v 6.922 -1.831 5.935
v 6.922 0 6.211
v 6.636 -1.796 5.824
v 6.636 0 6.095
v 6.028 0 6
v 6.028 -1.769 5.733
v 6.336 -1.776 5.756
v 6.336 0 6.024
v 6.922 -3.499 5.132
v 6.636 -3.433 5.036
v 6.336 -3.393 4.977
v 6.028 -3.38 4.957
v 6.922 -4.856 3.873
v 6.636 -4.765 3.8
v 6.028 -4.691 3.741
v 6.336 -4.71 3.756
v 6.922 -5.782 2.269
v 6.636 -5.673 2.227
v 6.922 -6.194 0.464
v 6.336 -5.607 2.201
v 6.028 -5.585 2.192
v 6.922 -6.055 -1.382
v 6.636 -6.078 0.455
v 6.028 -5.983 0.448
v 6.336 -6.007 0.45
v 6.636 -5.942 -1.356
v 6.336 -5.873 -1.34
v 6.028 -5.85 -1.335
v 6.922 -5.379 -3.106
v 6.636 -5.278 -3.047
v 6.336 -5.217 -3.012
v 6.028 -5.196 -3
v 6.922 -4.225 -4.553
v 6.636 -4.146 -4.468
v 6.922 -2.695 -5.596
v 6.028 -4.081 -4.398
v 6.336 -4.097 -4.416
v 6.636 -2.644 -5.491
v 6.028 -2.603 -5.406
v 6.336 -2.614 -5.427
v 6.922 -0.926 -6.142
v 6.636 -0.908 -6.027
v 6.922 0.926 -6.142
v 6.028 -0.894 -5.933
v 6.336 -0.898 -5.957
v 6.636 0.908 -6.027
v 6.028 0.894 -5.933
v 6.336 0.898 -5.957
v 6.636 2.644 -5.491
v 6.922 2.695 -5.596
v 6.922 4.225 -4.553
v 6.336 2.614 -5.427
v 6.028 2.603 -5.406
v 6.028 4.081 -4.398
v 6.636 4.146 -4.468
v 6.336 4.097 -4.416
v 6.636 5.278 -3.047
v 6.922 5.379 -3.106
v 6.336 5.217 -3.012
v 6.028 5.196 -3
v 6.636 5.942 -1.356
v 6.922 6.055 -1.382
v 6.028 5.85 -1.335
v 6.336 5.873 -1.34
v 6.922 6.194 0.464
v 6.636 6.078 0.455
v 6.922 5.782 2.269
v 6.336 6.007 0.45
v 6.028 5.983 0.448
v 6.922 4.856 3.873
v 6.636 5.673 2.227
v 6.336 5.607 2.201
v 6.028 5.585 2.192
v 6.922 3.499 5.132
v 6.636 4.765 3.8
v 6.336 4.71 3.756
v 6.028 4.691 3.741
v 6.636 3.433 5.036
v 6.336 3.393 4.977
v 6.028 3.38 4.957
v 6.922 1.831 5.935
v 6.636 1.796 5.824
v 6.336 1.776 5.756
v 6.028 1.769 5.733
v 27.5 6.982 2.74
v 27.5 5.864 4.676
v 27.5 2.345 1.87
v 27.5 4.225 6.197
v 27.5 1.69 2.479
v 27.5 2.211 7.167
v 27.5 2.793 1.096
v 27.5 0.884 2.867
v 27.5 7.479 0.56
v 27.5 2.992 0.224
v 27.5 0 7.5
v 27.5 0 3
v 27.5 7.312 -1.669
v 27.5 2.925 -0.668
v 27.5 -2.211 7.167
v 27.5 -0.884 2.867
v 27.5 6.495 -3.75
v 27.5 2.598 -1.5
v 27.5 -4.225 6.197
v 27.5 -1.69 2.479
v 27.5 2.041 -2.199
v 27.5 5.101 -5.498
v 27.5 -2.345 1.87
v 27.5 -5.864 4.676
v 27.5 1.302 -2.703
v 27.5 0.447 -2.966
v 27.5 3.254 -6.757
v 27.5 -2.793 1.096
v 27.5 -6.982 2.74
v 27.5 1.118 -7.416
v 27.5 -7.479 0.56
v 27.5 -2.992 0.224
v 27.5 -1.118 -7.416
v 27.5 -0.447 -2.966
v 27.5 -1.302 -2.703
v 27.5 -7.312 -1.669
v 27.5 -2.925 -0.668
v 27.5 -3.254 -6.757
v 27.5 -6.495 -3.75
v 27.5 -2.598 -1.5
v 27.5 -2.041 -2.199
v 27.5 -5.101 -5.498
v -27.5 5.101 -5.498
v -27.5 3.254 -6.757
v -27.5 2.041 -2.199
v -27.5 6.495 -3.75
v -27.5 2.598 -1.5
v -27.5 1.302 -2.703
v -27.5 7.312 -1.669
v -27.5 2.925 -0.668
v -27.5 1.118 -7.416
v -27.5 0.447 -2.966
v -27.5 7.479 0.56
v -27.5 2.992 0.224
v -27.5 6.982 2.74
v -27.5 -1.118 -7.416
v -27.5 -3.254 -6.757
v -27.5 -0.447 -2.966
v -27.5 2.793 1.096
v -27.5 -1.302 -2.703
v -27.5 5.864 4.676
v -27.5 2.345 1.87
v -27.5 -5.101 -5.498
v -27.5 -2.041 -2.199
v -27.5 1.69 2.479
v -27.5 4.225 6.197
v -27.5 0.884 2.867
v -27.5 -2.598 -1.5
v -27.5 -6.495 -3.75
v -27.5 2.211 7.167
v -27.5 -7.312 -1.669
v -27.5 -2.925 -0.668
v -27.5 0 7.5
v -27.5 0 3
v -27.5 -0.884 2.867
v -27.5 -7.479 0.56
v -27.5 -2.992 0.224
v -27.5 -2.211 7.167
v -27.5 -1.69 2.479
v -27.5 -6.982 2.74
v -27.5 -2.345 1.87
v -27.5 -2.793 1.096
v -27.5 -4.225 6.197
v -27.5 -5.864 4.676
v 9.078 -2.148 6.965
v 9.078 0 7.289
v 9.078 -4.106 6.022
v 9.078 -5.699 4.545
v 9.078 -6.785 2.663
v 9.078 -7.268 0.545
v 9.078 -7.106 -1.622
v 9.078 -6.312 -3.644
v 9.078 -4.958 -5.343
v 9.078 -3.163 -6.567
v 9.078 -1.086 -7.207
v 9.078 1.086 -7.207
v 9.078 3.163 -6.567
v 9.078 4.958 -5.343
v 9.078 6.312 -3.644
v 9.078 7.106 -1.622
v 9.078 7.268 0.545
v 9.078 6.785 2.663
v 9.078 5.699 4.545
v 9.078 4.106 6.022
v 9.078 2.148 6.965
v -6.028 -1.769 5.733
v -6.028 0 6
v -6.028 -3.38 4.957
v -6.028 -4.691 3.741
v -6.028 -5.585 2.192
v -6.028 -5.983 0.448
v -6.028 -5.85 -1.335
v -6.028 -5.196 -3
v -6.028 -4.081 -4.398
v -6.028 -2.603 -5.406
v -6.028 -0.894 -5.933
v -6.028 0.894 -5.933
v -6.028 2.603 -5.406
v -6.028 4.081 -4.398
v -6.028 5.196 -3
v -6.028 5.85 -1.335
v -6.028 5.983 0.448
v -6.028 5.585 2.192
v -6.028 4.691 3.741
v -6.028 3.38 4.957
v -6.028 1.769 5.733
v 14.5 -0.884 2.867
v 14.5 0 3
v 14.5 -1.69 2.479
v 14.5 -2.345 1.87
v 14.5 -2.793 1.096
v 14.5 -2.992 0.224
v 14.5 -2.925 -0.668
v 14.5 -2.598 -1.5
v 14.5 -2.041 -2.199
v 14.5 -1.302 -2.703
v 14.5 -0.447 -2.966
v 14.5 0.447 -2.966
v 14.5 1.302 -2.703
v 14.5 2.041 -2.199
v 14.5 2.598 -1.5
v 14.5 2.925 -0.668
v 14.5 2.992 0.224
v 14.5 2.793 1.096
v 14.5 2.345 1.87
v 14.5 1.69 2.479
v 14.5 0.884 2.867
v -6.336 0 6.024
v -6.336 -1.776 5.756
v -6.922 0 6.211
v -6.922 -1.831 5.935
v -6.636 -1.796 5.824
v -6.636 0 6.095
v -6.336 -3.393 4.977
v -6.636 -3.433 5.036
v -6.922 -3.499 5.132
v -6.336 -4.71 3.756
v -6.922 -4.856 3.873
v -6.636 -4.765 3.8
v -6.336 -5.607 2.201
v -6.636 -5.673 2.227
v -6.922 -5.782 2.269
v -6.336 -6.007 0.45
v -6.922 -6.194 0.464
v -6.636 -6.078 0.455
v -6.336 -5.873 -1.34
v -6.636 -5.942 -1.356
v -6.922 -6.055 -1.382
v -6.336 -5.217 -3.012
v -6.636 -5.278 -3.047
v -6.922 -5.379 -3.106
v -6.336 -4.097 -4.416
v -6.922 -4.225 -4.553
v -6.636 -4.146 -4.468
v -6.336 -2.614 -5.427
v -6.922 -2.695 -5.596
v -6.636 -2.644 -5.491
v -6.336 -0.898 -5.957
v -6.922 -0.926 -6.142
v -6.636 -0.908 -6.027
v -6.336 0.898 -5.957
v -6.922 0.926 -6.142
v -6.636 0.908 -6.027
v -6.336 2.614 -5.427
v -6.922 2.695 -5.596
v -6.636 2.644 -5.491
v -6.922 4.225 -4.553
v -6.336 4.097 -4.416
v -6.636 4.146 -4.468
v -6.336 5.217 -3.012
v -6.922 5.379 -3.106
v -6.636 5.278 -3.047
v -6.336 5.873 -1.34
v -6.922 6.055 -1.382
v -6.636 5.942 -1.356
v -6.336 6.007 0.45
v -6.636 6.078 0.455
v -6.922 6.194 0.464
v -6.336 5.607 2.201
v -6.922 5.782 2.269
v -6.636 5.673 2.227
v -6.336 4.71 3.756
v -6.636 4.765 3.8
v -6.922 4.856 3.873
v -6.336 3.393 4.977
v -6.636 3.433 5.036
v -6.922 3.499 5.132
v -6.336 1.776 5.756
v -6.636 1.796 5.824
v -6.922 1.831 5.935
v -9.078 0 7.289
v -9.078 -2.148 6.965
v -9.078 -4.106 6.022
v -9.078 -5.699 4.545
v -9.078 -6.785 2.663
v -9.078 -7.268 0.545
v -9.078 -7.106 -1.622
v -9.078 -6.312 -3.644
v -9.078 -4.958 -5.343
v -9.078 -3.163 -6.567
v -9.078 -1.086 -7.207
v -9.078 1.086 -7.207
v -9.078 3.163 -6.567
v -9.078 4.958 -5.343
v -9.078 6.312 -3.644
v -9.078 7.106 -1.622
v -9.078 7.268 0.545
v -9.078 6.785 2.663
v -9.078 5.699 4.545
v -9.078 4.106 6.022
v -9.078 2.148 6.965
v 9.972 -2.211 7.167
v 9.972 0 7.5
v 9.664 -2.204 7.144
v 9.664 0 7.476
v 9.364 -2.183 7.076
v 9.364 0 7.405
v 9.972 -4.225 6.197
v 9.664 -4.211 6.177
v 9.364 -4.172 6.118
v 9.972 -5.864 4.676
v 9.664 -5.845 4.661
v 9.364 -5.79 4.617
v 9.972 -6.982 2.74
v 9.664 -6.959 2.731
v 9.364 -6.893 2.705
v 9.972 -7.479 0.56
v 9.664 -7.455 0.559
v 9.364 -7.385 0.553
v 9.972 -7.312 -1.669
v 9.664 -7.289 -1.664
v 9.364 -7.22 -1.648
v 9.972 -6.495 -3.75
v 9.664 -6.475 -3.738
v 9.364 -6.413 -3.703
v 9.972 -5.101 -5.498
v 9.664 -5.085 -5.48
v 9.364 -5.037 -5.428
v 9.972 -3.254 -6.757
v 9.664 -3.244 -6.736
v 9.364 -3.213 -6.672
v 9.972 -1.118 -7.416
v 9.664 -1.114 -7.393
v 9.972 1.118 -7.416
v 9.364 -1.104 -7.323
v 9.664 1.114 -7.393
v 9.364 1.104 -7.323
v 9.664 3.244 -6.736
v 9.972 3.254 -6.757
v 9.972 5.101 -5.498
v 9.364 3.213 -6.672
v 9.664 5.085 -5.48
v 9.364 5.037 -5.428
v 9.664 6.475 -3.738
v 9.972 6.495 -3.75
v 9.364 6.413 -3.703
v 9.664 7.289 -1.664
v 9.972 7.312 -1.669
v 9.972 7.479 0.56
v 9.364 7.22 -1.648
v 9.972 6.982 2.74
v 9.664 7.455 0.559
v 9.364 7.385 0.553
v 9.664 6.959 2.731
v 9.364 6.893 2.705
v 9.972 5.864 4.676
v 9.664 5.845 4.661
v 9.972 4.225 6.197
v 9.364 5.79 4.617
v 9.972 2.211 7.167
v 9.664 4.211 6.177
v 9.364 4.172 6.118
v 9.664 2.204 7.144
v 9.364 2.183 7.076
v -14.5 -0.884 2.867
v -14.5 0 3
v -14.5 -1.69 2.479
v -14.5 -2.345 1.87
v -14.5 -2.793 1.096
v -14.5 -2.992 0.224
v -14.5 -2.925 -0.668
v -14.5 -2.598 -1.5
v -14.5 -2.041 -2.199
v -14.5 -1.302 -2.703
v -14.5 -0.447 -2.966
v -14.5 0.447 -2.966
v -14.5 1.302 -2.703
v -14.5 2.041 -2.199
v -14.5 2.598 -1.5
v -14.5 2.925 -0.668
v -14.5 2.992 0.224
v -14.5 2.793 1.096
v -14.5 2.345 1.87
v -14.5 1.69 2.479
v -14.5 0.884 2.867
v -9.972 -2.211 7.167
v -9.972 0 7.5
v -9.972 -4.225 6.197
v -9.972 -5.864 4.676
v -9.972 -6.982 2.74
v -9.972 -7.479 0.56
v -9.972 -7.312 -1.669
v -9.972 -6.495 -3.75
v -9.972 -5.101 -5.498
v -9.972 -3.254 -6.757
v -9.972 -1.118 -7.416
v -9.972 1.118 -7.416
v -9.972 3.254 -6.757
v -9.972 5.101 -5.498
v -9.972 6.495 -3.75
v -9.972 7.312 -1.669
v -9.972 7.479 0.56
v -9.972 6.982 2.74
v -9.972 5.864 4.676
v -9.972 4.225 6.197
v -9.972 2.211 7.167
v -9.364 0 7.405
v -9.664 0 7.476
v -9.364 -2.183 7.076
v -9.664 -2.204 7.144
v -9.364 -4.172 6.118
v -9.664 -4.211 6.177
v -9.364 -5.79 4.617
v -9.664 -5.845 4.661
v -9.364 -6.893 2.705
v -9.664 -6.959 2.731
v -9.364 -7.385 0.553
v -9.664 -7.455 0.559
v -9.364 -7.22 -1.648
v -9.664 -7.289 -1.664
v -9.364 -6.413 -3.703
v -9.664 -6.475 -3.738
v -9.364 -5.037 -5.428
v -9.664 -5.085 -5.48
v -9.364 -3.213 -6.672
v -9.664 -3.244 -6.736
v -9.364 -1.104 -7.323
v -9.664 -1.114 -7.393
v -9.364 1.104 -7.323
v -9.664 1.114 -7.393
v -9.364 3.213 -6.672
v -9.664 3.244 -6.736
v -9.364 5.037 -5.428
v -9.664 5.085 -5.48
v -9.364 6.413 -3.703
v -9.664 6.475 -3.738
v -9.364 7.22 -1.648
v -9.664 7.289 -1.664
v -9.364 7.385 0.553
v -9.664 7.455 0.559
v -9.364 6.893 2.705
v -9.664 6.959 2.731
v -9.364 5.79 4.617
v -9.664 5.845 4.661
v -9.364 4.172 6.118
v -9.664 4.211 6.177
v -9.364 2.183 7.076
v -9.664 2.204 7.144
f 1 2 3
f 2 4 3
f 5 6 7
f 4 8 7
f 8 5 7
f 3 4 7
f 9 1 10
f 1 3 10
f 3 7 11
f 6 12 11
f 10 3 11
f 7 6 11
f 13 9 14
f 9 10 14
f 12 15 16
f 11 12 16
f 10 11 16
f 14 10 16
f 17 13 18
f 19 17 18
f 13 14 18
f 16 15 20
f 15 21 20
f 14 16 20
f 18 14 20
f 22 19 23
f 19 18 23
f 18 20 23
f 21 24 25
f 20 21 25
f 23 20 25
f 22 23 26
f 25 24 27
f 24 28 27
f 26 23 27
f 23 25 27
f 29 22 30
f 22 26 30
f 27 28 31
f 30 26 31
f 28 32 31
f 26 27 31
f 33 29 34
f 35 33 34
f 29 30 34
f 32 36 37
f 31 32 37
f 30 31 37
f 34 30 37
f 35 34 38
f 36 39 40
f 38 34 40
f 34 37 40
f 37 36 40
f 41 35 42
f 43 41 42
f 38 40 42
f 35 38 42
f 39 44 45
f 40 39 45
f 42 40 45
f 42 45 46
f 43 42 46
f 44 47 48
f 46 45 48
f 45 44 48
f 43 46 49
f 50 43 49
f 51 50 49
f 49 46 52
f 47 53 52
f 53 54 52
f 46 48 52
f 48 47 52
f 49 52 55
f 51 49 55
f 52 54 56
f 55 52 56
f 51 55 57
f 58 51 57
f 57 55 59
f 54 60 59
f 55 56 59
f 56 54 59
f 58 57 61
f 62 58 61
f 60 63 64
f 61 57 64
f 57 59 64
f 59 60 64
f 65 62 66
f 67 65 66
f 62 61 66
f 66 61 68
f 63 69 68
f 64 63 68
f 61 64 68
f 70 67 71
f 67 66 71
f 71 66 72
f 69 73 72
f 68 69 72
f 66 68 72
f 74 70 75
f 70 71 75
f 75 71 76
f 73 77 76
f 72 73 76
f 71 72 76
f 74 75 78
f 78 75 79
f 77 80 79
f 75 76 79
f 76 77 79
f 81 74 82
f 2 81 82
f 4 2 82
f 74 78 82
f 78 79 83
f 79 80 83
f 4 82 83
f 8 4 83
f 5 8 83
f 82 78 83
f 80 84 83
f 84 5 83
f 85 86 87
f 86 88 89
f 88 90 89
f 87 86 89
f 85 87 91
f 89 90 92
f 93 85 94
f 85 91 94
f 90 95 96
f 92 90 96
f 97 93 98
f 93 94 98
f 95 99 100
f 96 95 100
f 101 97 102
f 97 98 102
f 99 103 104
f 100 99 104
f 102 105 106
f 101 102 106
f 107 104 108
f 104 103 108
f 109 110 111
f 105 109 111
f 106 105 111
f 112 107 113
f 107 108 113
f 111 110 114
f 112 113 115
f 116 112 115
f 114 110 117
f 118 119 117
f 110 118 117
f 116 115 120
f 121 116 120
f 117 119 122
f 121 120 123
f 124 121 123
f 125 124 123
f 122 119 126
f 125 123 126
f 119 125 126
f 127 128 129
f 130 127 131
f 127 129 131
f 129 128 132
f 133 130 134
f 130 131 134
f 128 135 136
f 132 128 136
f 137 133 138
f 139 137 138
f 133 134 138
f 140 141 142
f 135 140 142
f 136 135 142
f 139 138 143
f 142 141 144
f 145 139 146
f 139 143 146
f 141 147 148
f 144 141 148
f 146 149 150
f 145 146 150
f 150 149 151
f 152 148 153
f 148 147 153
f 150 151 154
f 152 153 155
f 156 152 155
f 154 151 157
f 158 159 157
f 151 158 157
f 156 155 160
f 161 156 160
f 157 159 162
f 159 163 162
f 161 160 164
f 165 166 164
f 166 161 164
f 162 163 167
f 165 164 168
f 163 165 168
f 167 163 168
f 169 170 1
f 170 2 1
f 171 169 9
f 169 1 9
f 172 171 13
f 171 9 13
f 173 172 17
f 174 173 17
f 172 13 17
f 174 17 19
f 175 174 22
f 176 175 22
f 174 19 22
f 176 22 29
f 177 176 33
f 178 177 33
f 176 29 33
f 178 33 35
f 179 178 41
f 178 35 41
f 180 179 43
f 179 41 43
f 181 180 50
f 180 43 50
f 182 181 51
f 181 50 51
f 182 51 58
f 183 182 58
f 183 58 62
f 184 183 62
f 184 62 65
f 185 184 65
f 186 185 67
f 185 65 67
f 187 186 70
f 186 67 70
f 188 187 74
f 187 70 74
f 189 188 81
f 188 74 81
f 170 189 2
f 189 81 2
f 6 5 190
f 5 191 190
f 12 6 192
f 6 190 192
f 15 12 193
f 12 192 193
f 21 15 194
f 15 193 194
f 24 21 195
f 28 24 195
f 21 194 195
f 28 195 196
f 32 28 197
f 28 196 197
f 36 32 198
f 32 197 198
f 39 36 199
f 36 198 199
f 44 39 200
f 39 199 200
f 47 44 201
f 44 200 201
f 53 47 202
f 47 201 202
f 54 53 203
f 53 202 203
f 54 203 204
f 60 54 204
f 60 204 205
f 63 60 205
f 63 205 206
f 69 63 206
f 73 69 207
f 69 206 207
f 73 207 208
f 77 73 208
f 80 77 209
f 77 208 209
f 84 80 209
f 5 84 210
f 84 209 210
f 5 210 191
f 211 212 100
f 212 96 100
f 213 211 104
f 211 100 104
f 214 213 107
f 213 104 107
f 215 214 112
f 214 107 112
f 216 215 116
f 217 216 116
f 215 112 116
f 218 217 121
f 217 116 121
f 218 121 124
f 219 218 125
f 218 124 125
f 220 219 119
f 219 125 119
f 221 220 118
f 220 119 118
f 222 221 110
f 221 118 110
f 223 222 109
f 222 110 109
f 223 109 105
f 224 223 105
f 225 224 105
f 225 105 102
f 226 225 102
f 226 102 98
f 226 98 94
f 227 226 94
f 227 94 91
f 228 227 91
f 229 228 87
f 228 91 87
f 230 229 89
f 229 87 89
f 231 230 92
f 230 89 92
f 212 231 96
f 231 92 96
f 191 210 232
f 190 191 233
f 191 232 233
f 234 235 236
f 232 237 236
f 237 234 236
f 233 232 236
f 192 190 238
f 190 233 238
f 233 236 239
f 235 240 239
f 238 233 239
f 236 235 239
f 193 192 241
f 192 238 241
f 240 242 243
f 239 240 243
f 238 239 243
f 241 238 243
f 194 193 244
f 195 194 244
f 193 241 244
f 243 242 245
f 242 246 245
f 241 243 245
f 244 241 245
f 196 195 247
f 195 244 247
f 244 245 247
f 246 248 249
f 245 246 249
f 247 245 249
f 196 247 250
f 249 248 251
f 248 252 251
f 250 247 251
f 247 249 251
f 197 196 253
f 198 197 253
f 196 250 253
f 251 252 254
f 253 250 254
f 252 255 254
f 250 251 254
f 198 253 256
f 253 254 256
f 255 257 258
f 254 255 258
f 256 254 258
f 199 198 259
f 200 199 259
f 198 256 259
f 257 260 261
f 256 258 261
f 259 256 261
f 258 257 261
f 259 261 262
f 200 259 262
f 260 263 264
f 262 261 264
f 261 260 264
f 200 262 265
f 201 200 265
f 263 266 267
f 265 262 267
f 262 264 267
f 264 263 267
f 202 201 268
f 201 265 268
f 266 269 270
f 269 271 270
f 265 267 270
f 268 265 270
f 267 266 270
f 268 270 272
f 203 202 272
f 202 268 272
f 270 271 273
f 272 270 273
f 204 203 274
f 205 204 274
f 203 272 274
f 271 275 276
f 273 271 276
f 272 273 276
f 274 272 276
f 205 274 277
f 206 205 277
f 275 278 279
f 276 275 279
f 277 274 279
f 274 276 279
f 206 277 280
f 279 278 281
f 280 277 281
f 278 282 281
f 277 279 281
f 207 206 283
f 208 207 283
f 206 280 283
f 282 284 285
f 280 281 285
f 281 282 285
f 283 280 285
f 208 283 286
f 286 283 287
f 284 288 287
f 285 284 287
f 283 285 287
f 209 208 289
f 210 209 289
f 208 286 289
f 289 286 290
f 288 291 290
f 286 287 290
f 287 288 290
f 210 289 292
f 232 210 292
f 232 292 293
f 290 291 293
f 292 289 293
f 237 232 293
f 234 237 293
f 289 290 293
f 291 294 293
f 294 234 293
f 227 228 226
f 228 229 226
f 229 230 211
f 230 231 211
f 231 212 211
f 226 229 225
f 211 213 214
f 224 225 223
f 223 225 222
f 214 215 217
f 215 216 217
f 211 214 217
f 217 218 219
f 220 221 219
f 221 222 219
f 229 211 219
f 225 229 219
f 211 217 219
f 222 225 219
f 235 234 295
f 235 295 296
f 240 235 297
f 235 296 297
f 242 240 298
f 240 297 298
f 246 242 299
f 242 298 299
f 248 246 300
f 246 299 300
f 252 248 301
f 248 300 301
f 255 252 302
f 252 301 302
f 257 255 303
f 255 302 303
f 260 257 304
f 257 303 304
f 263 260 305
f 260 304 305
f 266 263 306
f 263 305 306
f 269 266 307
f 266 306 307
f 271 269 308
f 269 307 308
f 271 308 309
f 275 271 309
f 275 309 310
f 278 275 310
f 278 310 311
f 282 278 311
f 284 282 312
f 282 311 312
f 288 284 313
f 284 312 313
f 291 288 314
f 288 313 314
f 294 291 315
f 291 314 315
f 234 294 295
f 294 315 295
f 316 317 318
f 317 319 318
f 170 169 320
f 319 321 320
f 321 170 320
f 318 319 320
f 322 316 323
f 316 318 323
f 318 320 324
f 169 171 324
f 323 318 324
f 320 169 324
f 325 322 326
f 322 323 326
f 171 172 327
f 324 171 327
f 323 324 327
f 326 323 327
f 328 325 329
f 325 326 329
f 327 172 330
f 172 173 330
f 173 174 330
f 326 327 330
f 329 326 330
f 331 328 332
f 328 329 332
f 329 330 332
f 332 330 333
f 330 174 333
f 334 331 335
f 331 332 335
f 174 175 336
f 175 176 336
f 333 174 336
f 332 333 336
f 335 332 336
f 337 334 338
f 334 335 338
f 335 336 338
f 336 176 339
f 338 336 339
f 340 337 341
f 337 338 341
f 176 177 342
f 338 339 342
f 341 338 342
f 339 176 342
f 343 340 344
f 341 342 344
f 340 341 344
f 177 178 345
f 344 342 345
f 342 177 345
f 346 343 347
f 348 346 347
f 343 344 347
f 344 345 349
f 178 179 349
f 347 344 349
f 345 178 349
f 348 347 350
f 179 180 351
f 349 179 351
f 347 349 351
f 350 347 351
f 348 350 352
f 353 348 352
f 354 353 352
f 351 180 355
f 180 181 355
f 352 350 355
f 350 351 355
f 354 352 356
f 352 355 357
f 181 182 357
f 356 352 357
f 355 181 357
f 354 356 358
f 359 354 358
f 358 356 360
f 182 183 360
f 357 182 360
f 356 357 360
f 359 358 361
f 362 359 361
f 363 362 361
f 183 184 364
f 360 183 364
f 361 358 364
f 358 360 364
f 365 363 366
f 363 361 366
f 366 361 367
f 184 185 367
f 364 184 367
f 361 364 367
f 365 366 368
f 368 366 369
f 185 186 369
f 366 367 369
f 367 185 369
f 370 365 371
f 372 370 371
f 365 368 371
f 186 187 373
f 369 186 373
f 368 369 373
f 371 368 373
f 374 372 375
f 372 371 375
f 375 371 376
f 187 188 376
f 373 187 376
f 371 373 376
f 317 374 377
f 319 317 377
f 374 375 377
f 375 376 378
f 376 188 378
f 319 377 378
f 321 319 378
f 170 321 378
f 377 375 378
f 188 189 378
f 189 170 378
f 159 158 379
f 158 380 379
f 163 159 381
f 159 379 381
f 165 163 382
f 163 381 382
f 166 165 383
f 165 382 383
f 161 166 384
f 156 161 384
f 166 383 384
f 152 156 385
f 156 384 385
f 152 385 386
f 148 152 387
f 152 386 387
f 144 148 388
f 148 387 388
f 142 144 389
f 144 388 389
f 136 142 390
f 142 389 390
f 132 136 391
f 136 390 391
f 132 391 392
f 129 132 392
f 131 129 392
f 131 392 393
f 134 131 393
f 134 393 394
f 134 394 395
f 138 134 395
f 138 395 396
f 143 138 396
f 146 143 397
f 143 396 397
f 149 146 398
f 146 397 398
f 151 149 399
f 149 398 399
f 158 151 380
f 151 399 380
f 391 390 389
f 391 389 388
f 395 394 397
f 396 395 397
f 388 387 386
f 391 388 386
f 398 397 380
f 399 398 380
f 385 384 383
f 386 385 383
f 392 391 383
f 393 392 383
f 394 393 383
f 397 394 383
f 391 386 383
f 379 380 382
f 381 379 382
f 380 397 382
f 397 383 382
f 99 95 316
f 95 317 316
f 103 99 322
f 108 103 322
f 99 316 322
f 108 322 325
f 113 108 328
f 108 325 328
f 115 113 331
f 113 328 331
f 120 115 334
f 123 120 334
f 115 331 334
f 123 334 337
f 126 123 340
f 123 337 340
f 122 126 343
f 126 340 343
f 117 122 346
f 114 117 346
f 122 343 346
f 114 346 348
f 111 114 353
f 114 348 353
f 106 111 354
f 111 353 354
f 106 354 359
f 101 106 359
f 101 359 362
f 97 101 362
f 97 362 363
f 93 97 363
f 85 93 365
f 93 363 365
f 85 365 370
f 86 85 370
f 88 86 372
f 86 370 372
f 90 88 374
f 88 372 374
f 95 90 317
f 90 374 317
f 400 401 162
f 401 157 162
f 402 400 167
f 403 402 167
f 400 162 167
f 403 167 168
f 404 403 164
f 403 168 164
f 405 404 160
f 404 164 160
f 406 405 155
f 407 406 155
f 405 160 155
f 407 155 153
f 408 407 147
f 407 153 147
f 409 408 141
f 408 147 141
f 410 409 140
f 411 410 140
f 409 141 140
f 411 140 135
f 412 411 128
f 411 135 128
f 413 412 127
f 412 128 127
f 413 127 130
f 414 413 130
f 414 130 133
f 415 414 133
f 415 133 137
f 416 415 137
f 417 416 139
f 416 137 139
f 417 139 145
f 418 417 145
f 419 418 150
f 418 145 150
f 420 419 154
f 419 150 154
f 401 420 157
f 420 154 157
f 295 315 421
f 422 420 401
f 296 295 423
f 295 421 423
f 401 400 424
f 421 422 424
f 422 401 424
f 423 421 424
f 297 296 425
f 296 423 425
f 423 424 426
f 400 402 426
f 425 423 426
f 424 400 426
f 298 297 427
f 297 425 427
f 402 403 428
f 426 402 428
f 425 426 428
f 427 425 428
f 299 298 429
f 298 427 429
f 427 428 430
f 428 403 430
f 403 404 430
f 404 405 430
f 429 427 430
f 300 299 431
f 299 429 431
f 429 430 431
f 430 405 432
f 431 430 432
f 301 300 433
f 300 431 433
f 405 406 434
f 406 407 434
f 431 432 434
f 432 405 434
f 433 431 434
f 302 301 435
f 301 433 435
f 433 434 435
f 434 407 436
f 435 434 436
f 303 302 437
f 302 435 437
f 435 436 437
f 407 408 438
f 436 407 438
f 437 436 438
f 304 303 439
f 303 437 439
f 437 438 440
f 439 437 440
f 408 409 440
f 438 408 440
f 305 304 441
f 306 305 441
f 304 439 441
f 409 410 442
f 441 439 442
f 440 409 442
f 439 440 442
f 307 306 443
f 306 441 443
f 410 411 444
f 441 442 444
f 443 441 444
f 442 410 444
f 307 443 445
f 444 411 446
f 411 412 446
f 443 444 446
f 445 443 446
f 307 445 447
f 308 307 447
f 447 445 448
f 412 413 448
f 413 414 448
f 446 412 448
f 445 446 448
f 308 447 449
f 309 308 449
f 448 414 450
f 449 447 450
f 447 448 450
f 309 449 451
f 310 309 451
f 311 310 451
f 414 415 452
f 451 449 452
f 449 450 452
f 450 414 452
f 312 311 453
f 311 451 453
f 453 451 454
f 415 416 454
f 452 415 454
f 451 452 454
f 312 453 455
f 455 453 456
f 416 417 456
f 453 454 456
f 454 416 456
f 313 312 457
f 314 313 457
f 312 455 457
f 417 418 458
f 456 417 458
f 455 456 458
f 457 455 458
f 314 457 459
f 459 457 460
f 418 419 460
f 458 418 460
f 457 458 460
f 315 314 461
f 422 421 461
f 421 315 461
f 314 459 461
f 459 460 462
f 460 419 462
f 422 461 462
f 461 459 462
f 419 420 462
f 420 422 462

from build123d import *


with BuildPart() as part:
    # Sketch1 → Revolve1 (revolve)
    with BuildSketch(Plane.XY):
        with BuildLine():
            Line((-14.5, 0), (14.5, 0))
            Line((14.5, 0), (14.5, 3))
            Line((14.5, 3), (27.5, 3))
            Line((27.5, 3), (27.5, 7.5))
            Line((27.5, 7.5), (9.972135955, 7.5))
            ThreePointArc((9.972135955, 7.5), (9.512630114, 7.446497979), (9.077708764, 7.288854382))
            Line((9.077708764, 7.288854382), (6.922291236, 6.211145618))
            ThreePointArc((6.922291236, 6.211145618), (6.487369886, 6.053502021), (6.027864045, 6))
            Line((6.027864045, 6), (-6.027864045, 6))
            ThreePointArc((-6.027864045, 6), (-6.487369886, 6.053502021), (-6.922291236, 6.211145618))
            Line((-6.922291236, 6.211145618), (-9.077708764, 7.288854382))
            ThreePointArc((-9.077708764, 7.288854382), (-9.512630114, 7.446497979), (-9.972135955, 7.5))
            Line((-9.972135955, 7.5), (-27.5, 7.5))
            Line((-27.5, 7.5), (-27.5, 3))
            Line((-27.5, 3), (-14.5, 3))
            Line((-14.5, 3), (-14.5, 0))
        make_face()
    revolve(axis=Axis((-44.087306847, 0, 0), (1, 0, 0)))


solid = part.part
